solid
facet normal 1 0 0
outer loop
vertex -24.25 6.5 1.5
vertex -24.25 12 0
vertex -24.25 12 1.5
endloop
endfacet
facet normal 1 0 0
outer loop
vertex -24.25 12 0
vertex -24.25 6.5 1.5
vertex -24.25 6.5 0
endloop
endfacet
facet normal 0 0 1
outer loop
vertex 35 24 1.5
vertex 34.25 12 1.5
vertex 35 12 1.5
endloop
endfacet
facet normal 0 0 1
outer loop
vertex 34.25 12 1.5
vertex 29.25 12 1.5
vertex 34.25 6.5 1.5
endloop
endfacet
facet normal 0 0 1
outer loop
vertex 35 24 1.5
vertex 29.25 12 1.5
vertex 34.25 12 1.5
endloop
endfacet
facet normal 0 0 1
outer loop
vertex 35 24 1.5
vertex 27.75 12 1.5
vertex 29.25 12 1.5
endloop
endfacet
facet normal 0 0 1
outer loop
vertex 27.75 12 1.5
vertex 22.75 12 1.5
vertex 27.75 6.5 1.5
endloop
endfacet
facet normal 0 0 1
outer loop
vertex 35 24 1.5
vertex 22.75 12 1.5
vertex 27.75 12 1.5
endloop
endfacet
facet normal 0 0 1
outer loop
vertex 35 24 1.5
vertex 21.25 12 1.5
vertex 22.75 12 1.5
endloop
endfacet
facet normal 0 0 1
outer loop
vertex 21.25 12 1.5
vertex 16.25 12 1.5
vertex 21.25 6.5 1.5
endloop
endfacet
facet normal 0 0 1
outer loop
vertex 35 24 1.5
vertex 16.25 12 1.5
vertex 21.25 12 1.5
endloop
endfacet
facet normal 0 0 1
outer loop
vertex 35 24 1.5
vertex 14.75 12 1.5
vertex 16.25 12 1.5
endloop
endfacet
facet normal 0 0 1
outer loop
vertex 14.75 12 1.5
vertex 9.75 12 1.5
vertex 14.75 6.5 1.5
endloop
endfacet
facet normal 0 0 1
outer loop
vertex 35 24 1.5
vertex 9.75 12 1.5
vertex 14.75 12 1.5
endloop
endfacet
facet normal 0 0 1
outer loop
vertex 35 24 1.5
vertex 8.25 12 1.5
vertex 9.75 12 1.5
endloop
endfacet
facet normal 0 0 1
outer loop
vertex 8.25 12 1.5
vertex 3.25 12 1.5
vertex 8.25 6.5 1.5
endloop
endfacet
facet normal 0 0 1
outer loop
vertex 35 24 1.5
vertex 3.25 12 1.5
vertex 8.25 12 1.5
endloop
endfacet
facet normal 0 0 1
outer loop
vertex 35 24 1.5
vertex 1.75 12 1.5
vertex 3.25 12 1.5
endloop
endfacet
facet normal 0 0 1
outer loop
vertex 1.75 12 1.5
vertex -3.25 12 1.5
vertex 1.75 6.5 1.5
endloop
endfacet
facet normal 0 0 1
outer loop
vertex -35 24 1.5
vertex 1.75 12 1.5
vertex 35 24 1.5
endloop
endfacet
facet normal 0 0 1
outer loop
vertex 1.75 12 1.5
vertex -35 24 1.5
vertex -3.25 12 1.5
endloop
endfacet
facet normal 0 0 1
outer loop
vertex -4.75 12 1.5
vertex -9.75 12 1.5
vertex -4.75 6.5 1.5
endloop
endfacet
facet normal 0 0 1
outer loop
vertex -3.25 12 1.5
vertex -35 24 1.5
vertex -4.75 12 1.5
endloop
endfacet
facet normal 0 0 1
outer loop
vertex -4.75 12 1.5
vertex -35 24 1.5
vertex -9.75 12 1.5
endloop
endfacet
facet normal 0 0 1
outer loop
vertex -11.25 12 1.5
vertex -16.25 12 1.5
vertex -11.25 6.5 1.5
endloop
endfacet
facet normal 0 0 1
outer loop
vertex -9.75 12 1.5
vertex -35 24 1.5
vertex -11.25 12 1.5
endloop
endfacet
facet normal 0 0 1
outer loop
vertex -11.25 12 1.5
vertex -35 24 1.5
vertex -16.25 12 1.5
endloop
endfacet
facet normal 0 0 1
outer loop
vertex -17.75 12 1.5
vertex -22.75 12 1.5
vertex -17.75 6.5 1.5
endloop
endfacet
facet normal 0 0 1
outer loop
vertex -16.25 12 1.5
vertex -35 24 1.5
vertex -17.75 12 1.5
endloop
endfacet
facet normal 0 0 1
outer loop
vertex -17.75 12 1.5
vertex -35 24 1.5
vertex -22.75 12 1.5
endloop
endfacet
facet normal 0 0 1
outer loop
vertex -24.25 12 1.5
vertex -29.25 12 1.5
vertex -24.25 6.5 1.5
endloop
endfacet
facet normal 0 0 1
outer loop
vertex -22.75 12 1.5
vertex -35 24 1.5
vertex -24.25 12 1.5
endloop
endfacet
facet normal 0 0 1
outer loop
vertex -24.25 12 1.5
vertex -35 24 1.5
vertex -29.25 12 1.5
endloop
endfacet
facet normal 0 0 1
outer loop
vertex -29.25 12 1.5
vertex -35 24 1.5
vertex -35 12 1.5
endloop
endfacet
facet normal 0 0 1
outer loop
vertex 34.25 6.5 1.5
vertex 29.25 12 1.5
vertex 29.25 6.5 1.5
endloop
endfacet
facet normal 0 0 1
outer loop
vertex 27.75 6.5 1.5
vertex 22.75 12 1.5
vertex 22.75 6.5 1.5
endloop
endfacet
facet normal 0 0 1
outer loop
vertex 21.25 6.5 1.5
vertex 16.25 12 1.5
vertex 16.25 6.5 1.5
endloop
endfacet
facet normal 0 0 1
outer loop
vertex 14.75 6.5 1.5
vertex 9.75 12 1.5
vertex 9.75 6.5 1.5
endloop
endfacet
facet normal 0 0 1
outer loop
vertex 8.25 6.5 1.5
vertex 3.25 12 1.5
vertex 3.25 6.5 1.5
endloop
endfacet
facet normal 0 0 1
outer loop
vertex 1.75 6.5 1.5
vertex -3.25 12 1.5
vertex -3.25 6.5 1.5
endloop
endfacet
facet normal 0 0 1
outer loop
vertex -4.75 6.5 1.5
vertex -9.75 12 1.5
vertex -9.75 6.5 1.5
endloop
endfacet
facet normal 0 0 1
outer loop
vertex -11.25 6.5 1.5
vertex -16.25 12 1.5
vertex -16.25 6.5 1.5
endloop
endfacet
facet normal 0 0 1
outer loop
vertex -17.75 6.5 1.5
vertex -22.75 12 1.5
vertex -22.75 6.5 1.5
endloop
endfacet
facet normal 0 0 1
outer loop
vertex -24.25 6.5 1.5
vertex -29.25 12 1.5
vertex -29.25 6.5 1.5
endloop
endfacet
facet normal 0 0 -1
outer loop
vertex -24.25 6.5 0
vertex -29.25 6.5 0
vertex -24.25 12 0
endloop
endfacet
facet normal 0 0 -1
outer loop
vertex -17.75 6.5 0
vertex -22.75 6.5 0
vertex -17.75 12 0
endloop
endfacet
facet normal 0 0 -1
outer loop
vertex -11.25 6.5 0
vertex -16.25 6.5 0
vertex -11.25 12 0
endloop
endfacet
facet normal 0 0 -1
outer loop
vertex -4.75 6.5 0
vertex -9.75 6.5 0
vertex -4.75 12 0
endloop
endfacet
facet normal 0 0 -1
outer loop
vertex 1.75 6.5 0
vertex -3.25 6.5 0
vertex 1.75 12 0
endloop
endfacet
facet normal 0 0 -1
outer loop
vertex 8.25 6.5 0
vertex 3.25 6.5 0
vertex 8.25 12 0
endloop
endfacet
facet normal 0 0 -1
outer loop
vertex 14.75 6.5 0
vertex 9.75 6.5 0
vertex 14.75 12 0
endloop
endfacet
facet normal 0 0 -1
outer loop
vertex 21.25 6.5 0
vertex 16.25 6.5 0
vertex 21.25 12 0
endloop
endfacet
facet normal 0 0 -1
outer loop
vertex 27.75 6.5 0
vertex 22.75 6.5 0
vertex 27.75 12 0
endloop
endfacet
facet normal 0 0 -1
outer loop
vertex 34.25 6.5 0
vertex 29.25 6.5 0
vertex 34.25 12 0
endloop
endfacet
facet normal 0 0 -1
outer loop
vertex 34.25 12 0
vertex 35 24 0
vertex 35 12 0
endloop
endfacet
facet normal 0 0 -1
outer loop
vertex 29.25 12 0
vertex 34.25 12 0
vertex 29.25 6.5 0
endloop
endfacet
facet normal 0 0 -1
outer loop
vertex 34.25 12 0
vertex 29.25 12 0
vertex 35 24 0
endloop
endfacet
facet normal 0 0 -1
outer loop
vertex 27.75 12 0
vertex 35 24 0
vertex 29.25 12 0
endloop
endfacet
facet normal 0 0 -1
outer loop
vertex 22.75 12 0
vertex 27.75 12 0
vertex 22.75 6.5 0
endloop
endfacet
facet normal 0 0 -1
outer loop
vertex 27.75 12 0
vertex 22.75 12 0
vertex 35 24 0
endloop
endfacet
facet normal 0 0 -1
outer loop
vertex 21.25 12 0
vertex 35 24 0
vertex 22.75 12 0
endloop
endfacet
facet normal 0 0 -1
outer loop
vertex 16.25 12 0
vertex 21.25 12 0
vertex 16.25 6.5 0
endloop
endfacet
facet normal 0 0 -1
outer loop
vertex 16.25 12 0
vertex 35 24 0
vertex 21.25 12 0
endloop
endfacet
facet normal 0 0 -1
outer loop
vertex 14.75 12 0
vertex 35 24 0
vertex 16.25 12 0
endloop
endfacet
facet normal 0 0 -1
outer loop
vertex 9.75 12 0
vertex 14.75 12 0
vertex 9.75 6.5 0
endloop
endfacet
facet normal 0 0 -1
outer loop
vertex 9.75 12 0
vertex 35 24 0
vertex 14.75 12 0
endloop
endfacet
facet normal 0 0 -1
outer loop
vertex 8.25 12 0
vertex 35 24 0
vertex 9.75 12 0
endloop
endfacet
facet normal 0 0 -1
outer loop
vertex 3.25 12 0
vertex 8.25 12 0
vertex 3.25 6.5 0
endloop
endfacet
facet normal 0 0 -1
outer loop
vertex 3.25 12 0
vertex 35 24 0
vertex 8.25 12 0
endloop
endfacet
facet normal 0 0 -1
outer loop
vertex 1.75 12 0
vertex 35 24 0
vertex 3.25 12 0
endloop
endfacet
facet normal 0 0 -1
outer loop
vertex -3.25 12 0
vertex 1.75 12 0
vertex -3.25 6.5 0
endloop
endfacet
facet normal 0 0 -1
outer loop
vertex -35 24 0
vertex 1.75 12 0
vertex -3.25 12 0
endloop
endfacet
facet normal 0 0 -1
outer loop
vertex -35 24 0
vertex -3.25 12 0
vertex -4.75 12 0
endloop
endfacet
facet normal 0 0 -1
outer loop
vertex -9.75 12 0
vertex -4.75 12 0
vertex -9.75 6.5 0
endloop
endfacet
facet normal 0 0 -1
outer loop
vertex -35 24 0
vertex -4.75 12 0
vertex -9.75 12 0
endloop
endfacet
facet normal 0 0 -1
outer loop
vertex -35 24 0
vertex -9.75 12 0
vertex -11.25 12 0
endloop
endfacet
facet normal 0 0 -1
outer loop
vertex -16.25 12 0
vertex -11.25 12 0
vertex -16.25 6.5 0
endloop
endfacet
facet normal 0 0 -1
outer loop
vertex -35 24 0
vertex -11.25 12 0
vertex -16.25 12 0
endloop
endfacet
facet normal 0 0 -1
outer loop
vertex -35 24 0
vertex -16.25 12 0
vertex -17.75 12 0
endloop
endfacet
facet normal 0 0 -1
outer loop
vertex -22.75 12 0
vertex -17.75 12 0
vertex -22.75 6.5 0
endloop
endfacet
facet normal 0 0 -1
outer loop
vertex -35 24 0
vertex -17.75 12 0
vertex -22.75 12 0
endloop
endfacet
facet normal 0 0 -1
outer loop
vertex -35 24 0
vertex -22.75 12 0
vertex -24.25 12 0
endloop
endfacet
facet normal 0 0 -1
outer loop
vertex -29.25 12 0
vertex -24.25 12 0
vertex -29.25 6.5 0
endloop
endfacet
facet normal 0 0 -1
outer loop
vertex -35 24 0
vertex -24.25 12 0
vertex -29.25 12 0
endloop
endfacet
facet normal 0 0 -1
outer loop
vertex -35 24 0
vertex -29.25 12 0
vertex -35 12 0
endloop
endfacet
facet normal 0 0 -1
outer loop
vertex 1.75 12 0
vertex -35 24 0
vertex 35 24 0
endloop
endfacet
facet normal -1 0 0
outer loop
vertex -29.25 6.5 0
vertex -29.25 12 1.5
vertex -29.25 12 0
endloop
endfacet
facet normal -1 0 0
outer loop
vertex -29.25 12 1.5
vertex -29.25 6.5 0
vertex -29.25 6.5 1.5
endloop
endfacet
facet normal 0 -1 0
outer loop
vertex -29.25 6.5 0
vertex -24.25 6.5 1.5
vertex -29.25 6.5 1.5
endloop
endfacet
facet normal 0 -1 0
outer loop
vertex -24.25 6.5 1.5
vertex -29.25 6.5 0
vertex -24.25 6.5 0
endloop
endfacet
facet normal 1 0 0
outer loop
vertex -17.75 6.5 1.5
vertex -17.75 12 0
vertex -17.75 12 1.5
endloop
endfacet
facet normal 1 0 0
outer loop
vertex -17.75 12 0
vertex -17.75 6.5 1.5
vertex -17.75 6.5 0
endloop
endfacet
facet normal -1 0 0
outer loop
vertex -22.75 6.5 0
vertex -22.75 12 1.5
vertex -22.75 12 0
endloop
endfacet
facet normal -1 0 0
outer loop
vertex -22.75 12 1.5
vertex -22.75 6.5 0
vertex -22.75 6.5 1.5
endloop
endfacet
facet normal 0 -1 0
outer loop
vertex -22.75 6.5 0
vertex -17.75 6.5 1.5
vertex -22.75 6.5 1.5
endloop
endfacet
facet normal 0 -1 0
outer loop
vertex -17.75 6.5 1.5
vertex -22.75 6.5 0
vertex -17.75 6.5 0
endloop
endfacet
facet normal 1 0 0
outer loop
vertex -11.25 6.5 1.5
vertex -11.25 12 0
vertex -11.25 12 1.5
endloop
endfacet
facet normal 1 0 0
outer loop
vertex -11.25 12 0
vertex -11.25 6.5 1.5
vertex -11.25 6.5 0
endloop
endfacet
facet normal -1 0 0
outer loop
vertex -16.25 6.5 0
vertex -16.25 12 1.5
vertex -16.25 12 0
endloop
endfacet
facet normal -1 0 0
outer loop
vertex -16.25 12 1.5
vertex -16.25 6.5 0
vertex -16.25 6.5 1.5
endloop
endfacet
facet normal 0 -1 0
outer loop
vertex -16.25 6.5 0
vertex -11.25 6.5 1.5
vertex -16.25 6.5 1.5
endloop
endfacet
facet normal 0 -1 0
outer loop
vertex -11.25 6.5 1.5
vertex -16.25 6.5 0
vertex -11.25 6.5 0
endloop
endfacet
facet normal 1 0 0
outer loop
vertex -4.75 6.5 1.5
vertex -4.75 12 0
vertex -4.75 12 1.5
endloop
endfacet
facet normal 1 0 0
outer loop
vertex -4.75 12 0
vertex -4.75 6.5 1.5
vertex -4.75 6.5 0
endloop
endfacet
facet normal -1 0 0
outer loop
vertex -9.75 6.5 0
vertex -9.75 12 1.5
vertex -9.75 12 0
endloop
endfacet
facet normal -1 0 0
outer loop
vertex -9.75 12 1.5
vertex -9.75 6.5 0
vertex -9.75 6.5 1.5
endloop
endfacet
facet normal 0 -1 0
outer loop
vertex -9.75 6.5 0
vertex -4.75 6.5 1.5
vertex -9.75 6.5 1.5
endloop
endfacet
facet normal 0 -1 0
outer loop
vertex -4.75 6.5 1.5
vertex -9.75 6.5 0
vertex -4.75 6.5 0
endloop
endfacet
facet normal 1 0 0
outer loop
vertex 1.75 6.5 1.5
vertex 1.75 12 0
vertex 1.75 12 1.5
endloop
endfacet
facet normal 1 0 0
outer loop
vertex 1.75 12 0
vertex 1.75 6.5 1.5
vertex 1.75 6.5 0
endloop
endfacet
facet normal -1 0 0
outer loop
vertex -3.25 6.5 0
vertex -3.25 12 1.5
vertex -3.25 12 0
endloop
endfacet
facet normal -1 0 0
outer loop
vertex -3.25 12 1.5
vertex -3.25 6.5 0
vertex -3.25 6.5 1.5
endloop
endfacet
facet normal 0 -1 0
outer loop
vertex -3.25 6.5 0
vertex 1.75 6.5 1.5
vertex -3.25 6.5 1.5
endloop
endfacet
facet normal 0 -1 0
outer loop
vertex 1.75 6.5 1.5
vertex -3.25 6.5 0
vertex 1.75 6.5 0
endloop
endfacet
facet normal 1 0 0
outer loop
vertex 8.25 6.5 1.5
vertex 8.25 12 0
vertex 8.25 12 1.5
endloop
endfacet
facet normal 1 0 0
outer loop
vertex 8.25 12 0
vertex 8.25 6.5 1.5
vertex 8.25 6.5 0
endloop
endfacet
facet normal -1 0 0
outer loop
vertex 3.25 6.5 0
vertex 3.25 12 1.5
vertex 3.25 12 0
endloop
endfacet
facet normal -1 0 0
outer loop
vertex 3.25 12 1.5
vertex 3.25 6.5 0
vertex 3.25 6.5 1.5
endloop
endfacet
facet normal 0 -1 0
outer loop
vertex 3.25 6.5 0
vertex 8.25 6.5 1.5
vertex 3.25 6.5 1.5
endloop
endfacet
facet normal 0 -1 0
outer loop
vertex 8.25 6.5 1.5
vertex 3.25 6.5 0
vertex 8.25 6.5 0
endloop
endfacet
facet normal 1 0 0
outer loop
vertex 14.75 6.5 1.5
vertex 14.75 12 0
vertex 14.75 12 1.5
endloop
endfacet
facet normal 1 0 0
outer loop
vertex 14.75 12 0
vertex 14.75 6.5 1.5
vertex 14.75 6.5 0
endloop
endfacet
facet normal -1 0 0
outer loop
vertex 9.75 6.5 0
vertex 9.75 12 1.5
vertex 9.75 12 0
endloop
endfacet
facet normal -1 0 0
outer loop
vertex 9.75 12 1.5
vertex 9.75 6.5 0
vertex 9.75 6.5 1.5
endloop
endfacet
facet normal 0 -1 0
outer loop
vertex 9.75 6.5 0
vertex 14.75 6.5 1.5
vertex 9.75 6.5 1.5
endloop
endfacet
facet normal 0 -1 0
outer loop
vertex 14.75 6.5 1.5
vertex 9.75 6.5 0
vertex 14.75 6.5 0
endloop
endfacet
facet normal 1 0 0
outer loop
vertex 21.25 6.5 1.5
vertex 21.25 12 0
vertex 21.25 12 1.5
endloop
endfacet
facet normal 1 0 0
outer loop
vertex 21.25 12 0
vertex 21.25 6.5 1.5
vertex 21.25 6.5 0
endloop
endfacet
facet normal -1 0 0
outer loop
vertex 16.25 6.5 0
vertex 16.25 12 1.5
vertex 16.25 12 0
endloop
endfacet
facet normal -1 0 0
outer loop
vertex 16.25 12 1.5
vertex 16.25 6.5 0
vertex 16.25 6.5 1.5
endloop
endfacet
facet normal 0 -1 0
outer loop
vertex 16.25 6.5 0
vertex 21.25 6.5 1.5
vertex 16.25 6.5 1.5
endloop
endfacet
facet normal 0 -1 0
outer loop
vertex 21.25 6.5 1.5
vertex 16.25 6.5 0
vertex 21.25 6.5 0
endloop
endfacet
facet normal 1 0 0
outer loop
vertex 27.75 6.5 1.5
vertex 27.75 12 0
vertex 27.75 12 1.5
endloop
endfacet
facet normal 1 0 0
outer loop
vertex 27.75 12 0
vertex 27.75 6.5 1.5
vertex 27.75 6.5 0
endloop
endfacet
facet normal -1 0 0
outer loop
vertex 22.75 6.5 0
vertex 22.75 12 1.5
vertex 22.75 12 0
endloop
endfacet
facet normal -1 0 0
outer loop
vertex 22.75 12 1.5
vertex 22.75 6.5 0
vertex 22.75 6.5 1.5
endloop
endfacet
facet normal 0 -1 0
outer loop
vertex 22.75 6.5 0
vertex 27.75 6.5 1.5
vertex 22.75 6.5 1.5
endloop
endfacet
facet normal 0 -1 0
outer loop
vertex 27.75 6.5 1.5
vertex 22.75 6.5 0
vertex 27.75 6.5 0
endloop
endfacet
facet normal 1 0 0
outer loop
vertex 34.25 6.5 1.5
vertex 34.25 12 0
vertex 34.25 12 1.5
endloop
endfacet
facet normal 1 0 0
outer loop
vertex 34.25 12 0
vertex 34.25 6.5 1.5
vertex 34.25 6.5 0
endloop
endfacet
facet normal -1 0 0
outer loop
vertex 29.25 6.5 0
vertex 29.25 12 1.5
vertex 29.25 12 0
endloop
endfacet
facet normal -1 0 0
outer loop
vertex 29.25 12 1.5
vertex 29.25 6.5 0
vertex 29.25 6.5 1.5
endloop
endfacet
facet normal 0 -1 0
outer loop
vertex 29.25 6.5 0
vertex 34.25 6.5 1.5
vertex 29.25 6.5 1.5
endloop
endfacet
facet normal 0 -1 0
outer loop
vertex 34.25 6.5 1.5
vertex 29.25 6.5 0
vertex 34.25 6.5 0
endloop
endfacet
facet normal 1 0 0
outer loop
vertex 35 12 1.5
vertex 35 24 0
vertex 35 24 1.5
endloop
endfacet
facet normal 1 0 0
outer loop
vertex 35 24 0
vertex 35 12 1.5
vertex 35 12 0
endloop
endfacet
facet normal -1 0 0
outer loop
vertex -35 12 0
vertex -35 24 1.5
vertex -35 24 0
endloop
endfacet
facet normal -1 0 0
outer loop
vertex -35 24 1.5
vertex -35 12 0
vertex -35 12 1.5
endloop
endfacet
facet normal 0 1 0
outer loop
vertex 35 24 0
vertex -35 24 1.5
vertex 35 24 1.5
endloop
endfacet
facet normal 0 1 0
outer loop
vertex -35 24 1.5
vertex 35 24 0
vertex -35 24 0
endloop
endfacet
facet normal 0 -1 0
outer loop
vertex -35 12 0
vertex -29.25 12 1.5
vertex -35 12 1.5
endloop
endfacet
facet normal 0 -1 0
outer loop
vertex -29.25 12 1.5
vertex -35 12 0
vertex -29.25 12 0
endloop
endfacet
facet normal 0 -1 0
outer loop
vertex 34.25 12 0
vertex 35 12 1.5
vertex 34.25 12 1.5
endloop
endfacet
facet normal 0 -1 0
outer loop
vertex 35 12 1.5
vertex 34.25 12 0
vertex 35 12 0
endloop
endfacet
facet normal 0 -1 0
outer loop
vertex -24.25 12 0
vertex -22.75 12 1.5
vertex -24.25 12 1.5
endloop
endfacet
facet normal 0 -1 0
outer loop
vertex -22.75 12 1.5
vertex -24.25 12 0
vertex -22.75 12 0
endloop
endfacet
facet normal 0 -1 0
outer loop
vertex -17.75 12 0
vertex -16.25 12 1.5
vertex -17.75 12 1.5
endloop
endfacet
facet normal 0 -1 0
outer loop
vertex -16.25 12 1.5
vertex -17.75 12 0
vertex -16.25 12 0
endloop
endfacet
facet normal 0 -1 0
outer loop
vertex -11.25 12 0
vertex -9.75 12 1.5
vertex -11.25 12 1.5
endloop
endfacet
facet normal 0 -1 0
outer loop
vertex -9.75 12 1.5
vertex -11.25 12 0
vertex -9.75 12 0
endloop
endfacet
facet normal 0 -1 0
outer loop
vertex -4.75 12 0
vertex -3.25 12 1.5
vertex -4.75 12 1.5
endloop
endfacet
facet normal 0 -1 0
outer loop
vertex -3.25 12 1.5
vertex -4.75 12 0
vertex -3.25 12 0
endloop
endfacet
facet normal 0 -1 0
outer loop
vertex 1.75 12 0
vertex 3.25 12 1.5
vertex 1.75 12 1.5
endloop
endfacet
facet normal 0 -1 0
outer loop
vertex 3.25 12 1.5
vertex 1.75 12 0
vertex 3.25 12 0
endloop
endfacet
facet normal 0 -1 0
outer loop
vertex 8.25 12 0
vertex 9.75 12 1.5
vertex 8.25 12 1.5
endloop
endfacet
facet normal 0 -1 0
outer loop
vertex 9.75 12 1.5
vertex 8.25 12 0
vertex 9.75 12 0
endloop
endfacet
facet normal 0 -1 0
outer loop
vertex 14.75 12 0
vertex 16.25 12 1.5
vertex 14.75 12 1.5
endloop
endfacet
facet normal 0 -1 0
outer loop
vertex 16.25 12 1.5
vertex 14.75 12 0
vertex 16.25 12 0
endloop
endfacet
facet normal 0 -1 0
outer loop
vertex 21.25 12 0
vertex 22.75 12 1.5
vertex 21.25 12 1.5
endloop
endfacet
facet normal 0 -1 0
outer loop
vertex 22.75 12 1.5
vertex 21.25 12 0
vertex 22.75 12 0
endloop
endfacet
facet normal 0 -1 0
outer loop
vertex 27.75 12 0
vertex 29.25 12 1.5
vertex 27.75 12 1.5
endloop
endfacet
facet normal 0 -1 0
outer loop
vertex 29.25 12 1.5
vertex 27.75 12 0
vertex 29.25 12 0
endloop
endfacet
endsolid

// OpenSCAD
// 10-well agarose gel comb, printed flat (Z = thickness)

// --- Named dimensions (mm) ---
plate_thick   = 1.5;   // Z thickness of the whole comb
spine_len     = 70.0;  // X length of the back bar (spine)
spine_width   = 12.0;  // Y width of the back bar
tooth_w       = 5.0;   // X width of each tooth
tooth_len     = 12.0;  // Y length of each tooth (hangs in -Y from the spine)
gap           = 1.5;   // X gap between neighbouring teeth
n_teeth       = 10;    // number of teeth

// Derived layout values
tooth_pitch   = tooth_w + gap;                       // centre-to-centre spacing in X
row_width     = n_teeth * tooth_w + (n_teeth - 1) * gap; // total X span of the tooth row
row_x0        = -row_width / 2;                      // left edge of the tooth row (centred on X)

// Spine occupies Y in [0, spine_width].
// Teeth hang in -Y but are extended INTO the spine (overlap) so the gaps
// between teeth cut through the spine and form 10 real slots.
tooth_y0      = -tooth_len;                          // tooth tip (lowest Y)
tooth_y1      =  1.0;                                // tooth top (inside the spine)

// Shift the whole part in Y so the lowest point (tooth tips) sits at Y = 0.
y_offset      = -tooth_y0;   // = tooth_len

$fn = 64;

// Build in local coords (spine Y 0..spine_width, teeth Y tooth_y0..tooth_y1),
// then translate +Y so the part rests on the bed with its lowest face at Y = 0.
translate([0, y_offset, 0])
union() {
    // Back bar (spine)
    translate([-spine_len/2, 0, 0])
        cube([spine_len, spine_width, plate_thick], center=[true, false, false]);

    // 10 rectangular teeth, centred as a row on the spine in X
    for (i = [0 : n_teeth-1]) {
        x_c = row_x0 + tooth_w/2 + i * tooth_pitch;   // centre X of tooth i
        y_c = (tooth_y0 + tooth_y1) / 2;             // centre Y of tooth i
        translate([x_c, y_c, 0])
            cube([tooth_w, tooth_y1 - tooth_y0, plate_thick], center=[true, true, false]);
    }
}
